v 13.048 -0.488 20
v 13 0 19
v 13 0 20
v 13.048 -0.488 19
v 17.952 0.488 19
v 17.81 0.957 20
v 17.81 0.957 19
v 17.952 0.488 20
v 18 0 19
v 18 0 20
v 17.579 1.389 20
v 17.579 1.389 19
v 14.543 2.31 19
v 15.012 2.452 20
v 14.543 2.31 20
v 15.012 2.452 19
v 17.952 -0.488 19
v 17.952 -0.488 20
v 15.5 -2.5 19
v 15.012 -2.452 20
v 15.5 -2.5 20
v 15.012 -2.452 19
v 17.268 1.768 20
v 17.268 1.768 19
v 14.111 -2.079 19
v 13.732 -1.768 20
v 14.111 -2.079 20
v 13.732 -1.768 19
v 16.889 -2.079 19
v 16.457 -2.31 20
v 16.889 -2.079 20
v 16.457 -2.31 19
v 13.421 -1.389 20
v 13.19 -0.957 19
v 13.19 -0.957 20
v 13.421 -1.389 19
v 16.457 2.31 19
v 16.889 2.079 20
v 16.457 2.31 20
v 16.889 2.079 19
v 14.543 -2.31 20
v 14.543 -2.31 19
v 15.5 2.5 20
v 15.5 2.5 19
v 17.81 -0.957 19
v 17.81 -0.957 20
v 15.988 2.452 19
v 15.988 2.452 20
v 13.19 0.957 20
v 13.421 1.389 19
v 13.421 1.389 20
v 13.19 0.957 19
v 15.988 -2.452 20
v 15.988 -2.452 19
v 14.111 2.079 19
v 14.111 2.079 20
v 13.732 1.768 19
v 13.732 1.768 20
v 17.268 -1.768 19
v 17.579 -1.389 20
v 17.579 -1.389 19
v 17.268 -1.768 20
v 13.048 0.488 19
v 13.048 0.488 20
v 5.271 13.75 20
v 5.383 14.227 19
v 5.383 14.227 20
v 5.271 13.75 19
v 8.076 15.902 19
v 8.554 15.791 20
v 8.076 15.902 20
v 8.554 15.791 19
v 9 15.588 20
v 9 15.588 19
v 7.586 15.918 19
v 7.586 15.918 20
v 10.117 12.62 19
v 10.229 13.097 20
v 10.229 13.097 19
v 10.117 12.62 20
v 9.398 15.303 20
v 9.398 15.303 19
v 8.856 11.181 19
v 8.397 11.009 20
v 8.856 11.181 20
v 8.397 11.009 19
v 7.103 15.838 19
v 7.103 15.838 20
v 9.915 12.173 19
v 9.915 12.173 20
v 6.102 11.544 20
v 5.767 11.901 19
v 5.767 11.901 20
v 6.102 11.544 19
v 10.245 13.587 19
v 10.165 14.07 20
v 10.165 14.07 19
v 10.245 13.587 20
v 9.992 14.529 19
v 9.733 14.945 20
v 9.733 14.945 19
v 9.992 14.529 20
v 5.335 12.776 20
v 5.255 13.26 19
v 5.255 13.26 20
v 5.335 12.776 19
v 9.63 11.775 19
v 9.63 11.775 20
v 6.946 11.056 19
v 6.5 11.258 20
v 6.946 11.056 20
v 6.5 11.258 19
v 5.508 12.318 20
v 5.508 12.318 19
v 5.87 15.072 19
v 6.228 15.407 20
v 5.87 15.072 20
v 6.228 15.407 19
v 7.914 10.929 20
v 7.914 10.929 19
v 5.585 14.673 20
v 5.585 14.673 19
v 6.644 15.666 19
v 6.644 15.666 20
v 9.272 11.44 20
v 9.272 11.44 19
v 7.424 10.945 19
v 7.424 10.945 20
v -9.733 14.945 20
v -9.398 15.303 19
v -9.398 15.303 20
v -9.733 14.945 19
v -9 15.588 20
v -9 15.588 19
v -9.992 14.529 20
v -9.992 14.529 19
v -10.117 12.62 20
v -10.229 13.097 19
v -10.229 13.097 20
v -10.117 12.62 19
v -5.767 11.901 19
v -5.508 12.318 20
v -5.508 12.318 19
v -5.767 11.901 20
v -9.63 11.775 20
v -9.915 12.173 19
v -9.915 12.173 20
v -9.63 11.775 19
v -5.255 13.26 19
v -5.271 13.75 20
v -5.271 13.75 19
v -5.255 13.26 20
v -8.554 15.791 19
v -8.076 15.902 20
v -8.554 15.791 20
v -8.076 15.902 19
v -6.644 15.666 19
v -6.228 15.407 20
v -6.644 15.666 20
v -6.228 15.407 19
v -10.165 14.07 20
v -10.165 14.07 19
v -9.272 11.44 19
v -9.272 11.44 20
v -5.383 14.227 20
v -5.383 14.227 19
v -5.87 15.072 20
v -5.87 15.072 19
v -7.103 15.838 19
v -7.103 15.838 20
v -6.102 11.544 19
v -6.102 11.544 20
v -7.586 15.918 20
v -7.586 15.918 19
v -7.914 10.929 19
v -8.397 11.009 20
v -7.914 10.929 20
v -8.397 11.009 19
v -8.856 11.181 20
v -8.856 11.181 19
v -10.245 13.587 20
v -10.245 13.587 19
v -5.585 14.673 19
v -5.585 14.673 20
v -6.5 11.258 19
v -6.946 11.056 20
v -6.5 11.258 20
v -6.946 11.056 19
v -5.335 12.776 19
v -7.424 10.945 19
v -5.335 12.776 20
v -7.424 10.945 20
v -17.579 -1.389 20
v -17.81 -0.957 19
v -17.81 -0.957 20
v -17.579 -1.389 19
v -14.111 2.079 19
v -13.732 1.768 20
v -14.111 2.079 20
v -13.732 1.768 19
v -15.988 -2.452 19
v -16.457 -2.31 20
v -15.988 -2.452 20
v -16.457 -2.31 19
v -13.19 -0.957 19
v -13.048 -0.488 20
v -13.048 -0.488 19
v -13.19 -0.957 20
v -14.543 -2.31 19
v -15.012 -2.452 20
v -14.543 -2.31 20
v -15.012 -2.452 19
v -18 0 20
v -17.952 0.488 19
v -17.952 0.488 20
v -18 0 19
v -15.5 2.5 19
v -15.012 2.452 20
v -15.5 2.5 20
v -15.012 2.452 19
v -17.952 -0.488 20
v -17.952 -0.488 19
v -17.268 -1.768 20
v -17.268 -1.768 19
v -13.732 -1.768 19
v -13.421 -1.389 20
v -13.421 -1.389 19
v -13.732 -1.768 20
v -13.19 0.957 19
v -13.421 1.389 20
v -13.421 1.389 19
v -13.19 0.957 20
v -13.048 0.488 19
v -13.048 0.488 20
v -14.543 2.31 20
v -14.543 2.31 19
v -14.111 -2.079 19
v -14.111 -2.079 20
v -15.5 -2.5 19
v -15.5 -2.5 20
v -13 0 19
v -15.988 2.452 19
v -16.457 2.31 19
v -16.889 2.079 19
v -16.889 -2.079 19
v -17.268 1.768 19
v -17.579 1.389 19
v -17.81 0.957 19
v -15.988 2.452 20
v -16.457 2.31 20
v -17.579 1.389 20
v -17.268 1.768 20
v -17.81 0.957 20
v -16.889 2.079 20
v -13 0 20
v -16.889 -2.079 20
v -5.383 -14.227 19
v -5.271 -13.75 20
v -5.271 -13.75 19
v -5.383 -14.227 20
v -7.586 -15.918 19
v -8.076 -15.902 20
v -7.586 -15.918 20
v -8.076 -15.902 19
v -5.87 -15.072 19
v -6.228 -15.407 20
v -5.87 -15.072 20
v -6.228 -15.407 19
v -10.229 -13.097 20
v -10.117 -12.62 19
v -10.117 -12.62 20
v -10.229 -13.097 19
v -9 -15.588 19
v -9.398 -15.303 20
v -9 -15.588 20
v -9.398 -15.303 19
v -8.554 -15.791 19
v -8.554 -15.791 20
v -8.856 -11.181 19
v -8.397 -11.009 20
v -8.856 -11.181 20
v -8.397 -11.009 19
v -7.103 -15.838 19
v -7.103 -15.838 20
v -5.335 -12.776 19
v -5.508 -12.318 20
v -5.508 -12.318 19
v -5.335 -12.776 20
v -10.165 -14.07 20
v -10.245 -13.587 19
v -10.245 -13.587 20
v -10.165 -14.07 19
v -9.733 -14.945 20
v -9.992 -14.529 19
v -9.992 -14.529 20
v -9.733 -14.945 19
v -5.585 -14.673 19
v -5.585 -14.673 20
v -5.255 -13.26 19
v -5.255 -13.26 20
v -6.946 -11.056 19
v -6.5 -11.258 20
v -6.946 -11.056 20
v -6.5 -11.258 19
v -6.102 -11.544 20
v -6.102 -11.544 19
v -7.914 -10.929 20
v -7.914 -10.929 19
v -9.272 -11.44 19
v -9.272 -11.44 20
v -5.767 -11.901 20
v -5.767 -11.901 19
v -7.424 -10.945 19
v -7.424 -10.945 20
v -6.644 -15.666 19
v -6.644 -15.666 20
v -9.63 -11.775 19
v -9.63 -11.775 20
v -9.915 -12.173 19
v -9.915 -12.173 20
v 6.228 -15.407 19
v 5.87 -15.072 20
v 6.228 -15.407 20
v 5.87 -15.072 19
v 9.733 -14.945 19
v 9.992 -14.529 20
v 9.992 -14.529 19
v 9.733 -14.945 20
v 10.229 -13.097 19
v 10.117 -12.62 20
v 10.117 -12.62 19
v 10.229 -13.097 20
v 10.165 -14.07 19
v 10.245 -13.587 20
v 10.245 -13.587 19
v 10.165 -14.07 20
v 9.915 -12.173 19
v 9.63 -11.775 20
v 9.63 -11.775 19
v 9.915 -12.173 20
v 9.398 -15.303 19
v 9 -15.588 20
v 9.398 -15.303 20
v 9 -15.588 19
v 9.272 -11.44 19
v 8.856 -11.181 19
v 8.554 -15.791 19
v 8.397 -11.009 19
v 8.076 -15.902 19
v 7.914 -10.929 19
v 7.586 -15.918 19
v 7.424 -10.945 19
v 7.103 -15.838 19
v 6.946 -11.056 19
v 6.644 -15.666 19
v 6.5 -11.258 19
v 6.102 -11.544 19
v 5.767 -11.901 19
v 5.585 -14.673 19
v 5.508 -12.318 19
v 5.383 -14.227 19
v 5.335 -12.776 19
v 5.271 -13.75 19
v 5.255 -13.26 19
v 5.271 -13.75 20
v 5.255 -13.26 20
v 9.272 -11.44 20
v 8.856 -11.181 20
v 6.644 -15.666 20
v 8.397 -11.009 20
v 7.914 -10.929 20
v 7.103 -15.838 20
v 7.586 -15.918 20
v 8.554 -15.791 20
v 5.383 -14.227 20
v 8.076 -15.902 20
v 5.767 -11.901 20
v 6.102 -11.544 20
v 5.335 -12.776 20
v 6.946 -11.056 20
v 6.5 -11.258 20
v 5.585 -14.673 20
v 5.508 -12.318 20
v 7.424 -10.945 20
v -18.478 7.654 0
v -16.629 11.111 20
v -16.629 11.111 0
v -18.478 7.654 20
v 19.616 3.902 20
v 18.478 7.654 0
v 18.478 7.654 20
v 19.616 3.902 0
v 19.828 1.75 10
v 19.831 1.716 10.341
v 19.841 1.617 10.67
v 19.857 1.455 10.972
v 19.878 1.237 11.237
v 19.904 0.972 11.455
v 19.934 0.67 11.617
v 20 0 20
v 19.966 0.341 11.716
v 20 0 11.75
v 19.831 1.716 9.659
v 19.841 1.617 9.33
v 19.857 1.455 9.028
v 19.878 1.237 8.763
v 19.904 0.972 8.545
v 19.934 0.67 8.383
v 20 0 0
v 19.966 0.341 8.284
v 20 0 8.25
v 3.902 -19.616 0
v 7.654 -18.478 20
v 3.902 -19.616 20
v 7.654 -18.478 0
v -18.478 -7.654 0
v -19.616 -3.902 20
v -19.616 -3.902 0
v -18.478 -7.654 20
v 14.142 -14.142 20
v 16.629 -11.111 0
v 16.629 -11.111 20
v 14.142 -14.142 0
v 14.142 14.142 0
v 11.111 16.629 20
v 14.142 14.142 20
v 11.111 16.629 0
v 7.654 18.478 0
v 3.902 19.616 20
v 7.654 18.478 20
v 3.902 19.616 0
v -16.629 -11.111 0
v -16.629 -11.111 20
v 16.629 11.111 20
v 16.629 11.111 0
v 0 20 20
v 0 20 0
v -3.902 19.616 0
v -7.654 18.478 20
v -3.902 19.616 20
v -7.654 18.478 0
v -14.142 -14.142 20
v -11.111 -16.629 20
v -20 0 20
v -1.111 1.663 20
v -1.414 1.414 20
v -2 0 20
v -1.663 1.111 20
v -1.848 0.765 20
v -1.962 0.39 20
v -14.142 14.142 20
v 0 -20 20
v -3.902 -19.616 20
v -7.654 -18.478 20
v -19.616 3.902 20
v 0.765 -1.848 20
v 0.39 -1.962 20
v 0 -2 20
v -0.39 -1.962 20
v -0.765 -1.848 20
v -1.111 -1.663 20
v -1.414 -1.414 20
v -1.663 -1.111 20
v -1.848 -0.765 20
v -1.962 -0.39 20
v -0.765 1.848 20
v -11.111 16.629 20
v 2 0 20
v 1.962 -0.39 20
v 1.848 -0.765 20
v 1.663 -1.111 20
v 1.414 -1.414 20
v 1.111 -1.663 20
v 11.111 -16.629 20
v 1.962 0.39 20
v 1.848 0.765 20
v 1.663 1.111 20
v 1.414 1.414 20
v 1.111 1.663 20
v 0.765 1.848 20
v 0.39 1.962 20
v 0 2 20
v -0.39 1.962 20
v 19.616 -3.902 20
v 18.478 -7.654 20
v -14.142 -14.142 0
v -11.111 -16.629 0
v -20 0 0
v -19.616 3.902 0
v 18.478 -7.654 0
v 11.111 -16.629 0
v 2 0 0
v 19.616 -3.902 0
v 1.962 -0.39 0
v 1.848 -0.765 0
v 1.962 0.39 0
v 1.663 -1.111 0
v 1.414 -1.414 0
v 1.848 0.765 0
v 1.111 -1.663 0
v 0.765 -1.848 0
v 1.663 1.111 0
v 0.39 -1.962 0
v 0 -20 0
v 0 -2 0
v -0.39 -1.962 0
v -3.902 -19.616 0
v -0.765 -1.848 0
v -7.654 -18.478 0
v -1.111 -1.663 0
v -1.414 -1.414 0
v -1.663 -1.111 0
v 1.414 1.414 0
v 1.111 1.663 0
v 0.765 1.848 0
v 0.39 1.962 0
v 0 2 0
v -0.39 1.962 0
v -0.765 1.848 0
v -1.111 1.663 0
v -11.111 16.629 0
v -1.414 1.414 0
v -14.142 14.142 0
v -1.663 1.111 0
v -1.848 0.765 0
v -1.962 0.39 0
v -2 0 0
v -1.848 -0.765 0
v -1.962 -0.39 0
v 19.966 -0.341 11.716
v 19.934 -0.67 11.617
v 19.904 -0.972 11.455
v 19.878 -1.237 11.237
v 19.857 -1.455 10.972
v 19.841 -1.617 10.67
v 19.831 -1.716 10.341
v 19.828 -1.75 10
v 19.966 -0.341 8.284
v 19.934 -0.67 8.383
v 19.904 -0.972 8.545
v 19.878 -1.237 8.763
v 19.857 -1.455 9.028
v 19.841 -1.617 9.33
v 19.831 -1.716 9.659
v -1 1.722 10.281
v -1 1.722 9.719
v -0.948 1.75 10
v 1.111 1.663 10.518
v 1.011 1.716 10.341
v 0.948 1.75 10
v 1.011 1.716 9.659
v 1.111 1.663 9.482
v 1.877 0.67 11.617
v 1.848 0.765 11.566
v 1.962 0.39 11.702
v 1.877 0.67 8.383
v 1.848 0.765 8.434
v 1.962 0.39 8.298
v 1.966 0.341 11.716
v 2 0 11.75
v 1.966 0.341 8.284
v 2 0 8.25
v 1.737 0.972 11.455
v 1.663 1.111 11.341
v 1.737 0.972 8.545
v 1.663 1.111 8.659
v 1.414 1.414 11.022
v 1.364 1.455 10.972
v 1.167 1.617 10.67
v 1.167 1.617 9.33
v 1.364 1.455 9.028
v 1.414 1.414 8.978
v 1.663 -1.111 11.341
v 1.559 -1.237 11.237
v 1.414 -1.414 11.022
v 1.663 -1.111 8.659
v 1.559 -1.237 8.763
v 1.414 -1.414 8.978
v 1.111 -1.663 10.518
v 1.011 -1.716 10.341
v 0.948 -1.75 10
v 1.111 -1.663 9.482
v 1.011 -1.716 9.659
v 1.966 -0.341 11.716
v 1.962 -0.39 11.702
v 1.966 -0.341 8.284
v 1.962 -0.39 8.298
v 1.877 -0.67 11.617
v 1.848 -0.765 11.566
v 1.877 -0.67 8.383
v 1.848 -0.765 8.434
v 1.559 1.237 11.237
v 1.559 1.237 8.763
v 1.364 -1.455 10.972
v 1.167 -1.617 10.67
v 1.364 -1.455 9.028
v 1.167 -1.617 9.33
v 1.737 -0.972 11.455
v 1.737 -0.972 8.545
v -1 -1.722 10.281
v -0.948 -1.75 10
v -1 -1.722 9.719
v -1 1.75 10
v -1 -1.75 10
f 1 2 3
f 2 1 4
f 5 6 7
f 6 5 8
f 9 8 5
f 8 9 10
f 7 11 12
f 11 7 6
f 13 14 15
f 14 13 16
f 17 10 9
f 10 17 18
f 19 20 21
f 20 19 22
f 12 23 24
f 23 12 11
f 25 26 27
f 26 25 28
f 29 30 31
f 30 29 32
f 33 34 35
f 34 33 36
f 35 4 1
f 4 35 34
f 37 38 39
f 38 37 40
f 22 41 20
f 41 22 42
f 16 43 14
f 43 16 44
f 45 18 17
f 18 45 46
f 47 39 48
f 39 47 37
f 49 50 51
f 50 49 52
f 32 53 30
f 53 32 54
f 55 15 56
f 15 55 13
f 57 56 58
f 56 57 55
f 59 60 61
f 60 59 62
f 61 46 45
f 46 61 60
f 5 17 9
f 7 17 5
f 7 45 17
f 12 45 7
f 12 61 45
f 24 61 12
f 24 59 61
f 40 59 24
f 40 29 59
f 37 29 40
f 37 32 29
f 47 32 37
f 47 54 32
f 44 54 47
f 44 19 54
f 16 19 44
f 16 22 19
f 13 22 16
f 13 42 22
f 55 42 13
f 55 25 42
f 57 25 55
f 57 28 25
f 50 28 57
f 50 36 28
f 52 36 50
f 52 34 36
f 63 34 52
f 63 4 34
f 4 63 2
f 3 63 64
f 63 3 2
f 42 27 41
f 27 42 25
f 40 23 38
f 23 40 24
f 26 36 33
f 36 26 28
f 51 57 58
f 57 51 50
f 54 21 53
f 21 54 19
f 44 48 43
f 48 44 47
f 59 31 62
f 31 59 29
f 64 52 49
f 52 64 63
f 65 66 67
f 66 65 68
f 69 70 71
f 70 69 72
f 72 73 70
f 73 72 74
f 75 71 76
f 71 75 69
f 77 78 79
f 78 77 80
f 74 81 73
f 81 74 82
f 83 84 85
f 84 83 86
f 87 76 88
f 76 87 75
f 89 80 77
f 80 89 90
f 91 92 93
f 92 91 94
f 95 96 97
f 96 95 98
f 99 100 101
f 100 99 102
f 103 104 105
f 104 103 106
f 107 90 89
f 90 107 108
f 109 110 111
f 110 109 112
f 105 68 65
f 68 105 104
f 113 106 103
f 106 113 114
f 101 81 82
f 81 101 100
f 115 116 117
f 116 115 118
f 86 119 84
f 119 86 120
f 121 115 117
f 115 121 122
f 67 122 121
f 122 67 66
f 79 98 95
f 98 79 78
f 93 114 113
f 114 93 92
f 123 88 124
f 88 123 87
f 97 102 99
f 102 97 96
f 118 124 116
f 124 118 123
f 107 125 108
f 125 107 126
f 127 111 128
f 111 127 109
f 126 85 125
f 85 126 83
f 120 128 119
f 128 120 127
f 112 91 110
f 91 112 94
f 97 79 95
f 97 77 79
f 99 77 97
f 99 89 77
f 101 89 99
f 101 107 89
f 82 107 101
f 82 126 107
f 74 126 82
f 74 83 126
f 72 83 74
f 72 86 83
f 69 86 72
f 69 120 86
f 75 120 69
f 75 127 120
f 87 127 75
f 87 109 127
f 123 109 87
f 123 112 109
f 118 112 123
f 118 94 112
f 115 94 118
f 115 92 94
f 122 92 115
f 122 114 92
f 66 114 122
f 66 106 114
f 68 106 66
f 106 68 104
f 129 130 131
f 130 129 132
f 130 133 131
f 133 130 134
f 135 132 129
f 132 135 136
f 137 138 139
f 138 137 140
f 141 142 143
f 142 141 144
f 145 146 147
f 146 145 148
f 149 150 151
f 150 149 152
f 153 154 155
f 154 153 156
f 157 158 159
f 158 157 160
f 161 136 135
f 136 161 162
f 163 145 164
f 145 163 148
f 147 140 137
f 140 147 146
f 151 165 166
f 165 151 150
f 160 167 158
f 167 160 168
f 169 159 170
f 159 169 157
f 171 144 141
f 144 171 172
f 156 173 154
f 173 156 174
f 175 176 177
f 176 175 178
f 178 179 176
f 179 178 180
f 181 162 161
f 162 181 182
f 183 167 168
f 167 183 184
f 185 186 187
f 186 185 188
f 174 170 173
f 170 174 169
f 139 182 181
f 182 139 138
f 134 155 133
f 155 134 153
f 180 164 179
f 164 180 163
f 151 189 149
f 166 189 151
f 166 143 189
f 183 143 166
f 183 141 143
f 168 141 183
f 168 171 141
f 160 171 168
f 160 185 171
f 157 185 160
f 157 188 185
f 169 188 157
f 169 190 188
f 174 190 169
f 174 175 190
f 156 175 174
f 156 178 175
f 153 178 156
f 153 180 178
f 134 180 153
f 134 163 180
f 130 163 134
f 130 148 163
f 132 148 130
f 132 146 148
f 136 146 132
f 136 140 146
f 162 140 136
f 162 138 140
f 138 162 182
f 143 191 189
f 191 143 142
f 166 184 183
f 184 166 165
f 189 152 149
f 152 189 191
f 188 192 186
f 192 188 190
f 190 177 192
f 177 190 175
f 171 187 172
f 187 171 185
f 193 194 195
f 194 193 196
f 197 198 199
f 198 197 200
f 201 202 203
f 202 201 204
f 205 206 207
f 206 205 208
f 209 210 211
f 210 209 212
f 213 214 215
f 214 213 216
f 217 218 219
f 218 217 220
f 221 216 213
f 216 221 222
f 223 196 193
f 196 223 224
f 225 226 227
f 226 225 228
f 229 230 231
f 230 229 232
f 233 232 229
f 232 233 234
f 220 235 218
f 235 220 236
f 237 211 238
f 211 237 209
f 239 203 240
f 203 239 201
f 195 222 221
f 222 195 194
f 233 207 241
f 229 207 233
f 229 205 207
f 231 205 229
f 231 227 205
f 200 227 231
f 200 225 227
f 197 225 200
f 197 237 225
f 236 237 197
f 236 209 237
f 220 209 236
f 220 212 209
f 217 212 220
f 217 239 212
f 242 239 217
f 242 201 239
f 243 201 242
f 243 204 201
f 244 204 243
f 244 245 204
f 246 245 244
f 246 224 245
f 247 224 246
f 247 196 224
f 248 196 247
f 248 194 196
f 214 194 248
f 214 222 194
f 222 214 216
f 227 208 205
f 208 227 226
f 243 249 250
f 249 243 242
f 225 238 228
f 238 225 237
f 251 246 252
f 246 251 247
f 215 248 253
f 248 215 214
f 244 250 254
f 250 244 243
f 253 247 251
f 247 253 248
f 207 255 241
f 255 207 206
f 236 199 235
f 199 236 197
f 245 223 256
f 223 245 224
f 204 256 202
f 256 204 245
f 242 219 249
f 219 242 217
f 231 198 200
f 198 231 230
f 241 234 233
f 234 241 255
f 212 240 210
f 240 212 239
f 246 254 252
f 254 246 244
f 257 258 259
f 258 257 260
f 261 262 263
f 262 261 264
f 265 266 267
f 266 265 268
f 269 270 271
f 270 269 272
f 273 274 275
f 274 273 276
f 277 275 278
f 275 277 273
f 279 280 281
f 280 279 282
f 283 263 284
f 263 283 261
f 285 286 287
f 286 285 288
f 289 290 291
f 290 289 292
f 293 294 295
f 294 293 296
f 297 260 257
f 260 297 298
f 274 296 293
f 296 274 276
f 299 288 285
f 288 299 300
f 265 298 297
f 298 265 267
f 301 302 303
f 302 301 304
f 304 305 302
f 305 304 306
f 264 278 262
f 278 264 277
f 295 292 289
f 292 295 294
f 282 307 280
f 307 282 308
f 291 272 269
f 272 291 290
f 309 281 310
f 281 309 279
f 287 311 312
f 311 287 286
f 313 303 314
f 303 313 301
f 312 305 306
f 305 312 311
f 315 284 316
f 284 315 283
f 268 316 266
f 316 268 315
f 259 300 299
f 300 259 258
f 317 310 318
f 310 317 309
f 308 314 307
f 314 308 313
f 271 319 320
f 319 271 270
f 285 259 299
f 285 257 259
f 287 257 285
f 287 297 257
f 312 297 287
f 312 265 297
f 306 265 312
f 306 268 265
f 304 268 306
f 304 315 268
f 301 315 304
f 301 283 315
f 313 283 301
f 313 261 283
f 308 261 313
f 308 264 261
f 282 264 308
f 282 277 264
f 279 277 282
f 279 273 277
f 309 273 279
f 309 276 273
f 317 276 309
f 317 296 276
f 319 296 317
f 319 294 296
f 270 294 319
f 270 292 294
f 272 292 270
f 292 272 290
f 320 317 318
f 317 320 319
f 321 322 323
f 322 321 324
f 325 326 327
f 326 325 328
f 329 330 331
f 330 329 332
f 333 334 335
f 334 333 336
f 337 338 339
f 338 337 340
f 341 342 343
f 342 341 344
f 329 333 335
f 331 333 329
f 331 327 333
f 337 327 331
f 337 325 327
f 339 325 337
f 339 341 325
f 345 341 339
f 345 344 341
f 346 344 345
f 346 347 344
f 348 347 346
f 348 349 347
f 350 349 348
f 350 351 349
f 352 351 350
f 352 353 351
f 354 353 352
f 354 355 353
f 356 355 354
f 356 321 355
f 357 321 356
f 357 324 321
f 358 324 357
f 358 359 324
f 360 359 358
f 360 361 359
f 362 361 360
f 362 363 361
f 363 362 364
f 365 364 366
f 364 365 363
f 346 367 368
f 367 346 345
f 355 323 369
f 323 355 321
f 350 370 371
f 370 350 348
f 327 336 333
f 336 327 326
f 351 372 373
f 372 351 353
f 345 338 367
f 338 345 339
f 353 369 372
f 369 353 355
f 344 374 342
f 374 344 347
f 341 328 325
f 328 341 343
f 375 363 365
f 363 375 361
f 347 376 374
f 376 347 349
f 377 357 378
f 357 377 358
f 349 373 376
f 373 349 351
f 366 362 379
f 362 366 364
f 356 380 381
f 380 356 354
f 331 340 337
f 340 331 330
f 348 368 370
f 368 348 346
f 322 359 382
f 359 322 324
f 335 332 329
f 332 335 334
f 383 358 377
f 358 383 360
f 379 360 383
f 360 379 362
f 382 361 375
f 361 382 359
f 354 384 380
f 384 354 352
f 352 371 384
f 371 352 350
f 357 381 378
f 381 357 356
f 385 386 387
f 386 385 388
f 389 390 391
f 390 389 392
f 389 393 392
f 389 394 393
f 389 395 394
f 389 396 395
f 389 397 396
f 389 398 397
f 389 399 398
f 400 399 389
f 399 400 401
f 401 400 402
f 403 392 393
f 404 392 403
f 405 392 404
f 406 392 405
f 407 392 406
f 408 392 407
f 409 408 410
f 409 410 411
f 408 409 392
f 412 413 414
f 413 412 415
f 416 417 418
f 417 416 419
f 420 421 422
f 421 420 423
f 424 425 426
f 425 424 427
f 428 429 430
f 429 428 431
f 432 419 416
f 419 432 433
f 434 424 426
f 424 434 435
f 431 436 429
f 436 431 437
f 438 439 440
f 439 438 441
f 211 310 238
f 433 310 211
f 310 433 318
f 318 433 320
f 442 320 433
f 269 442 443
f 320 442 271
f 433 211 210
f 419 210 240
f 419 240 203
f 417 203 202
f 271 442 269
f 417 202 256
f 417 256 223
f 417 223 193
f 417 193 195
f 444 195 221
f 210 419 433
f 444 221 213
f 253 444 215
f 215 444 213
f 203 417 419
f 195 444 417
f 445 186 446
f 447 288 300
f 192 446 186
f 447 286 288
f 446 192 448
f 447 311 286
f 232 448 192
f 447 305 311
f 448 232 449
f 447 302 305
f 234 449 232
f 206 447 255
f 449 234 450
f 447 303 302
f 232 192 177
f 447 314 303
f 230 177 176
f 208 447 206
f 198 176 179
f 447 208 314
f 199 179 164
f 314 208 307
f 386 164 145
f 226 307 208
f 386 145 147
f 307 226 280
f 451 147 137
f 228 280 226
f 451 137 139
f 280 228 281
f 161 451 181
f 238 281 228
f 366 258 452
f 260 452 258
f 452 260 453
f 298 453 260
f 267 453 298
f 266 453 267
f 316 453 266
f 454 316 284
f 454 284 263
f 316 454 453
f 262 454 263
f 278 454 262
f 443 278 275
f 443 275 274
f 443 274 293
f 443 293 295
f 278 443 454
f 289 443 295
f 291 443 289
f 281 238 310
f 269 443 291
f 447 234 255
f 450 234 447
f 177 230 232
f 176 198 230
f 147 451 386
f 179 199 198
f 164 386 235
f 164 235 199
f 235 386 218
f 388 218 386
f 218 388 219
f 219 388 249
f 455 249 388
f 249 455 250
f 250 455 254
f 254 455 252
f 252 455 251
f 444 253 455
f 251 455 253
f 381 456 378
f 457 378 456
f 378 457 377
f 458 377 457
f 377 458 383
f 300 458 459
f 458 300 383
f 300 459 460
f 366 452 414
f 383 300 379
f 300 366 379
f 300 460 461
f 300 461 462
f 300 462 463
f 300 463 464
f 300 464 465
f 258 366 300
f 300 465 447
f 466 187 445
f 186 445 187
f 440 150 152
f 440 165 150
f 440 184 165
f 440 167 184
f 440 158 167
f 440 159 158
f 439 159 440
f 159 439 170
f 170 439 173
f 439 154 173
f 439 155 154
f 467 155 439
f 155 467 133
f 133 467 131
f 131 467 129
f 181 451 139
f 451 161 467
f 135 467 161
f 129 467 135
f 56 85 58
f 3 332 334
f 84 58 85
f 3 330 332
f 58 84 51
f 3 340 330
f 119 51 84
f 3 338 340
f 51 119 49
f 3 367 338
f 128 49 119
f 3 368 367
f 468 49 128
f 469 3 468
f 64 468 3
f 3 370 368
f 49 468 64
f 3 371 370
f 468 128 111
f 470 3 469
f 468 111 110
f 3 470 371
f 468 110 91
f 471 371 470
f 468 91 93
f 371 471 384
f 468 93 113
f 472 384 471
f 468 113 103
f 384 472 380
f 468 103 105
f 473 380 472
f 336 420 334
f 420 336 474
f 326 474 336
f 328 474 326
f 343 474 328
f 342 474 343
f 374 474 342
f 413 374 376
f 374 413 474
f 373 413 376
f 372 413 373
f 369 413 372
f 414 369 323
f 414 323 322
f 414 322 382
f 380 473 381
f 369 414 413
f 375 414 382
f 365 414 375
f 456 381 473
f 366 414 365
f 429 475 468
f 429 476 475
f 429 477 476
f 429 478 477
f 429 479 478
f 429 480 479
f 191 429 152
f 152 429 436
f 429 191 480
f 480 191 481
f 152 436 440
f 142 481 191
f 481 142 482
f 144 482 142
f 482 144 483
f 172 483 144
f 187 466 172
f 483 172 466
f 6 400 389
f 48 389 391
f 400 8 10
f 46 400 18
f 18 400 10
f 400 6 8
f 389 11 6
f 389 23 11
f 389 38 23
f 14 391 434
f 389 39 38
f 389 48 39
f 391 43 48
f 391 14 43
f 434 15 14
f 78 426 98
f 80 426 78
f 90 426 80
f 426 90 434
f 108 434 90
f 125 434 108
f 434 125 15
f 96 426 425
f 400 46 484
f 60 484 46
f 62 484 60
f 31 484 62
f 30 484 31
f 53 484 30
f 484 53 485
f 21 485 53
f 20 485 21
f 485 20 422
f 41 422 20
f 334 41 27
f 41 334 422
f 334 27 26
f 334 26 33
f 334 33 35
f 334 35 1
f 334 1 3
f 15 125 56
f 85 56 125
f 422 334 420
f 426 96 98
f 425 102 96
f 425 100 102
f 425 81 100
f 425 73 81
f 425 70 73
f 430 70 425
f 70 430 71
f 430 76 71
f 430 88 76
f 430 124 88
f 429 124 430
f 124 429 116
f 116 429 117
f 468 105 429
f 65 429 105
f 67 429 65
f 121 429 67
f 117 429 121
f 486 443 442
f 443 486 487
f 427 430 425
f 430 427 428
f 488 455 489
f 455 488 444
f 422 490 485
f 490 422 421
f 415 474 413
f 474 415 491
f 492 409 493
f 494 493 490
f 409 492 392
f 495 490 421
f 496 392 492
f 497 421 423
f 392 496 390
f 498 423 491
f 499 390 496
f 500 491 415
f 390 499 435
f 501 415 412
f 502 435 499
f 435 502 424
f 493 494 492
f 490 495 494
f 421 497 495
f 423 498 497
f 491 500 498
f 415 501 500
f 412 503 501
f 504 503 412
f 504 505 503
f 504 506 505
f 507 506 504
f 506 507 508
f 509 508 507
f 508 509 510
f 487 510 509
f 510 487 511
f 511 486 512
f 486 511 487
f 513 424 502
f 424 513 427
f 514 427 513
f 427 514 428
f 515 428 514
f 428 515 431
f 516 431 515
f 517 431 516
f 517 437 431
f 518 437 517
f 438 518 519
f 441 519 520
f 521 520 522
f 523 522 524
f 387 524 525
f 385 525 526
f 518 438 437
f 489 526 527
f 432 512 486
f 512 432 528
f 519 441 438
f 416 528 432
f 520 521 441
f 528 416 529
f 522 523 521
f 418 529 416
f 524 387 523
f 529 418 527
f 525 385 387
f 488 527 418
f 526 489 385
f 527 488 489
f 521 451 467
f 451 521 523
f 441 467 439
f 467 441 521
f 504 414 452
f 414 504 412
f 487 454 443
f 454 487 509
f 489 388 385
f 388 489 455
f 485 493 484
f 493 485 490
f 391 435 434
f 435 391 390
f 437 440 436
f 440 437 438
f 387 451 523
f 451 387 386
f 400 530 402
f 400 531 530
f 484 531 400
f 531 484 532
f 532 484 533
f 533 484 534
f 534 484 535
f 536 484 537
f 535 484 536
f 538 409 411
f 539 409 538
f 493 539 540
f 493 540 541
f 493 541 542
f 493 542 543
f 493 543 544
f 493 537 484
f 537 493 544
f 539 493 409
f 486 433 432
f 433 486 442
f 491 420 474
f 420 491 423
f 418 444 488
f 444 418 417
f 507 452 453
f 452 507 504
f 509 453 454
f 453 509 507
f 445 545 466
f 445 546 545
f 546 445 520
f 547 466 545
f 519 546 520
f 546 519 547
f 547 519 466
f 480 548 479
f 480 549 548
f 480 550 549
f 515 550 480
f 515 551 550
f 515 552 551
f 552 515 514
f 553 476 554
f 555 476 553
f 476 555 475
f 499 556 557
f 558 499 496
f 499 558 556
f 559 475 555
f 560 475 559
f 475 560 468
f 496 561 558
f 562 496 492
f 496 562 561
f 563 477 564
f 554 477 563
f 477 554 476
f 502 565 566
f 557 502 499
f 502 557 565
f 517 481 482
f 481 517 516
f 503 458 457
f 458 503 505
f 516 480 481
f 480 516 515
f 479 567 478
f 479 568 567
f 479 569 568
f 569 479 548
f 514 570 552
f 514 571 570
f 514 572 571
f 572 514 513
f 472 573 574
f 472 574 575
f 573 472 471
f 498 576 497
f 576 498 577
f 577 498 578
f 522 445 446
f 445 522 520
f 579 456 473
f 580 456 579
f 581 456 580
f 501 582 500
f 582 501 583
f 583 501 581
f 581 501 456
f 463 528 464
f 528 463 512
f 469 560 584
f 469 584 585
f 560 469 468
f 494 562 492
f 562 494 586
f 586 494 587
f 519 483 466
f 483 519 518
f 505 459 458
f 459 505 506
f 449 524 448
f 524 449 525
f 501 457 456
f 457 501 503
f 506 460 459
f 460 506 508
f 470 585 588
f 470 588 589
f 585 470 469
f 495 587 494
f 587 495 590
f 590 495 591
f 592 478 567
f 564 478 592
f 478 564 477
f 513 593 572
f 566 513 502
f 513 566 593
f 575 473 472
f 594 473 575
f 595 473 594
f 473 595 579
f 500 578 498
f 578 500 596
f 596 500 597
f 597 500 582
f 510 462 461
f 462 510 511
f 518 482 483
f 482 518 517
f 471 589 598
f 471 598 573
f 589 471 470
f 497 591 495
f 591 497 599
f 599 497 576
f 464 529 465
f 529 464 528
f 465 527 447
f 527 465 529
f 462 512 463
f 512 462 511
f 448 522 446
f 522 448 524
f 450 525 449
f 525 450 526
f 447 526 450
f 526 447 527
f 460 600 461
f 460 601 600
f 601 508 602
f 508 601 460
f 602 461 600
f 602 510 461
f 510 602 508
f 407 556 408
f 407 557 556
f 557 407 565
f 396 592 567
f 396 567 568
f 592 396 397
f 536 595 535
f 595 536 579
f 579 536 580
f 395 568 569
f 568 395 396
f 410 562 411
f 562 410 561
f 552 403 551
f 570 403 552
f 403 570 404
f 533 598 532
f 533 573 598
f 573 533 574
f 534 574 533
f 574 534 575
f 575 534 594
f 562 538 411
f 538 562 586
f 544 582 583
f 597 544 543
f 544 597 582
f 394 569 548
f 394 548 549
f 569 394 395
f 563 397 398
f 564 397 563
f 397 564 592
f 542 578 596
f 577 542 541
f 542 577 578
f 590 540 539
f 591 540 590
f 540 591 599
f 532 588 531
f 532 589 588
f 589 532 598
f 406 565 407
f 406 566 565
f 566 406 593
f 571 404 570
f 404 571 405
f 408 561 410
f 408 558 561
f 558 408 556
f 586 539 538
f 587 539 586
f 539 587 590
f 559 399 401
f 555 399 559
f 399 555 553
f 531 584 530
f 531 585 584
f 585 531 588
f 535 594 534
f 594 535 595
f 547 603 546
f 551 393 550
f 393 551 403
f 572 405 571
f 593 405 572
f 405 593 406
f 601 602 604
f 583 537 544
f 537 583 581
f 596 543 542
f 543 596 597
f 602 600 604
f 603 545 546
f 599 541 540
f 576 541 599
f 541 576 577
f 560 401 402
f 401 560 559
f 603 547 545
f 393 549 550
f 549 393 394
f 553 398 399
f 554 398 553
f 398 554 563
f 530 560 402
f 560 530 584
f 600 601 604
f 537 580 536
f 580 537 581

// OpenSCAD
$fn = 32;

// ----------------------------------------------------------------------
// Control knob: dimpled knob
// ----------------------------------------------------------------------

// --- parameters (mm) ---
dimp_d = 5;               // finger dimple diameter
n_dimp = 6;               // number of dimples
dimp_r = 15.5;            // dimple ring radius
knob_d = 40;              // knob body diameter
knob_h = 20;              // knob body height
bore_d = 4;               // shaft bore diameter
set_d = 3.5;              // set screw bore diameter

dimp_step = 360 / n_dimp;  // dimple angular step

difference() {
  cylinder(h = knob_h, d = knob_d);
  translate([0, 0, -1]) cylinder(h = knob_h + 2, d = bore_d);
  translate([-1, 0, knob_h / 2]) rotate([0, 90, 0])
    cylinder(h = knob_d / 2 + bore_d / 2 + 2, d = set_d);  for (i = [0 : n_dimp - 1])
    rotate([0, 0, i * dimp_step])
      translate([dimp_r, 0, knob_h - 1])
        cylinder(h = 2, d = dimp_d);
}
